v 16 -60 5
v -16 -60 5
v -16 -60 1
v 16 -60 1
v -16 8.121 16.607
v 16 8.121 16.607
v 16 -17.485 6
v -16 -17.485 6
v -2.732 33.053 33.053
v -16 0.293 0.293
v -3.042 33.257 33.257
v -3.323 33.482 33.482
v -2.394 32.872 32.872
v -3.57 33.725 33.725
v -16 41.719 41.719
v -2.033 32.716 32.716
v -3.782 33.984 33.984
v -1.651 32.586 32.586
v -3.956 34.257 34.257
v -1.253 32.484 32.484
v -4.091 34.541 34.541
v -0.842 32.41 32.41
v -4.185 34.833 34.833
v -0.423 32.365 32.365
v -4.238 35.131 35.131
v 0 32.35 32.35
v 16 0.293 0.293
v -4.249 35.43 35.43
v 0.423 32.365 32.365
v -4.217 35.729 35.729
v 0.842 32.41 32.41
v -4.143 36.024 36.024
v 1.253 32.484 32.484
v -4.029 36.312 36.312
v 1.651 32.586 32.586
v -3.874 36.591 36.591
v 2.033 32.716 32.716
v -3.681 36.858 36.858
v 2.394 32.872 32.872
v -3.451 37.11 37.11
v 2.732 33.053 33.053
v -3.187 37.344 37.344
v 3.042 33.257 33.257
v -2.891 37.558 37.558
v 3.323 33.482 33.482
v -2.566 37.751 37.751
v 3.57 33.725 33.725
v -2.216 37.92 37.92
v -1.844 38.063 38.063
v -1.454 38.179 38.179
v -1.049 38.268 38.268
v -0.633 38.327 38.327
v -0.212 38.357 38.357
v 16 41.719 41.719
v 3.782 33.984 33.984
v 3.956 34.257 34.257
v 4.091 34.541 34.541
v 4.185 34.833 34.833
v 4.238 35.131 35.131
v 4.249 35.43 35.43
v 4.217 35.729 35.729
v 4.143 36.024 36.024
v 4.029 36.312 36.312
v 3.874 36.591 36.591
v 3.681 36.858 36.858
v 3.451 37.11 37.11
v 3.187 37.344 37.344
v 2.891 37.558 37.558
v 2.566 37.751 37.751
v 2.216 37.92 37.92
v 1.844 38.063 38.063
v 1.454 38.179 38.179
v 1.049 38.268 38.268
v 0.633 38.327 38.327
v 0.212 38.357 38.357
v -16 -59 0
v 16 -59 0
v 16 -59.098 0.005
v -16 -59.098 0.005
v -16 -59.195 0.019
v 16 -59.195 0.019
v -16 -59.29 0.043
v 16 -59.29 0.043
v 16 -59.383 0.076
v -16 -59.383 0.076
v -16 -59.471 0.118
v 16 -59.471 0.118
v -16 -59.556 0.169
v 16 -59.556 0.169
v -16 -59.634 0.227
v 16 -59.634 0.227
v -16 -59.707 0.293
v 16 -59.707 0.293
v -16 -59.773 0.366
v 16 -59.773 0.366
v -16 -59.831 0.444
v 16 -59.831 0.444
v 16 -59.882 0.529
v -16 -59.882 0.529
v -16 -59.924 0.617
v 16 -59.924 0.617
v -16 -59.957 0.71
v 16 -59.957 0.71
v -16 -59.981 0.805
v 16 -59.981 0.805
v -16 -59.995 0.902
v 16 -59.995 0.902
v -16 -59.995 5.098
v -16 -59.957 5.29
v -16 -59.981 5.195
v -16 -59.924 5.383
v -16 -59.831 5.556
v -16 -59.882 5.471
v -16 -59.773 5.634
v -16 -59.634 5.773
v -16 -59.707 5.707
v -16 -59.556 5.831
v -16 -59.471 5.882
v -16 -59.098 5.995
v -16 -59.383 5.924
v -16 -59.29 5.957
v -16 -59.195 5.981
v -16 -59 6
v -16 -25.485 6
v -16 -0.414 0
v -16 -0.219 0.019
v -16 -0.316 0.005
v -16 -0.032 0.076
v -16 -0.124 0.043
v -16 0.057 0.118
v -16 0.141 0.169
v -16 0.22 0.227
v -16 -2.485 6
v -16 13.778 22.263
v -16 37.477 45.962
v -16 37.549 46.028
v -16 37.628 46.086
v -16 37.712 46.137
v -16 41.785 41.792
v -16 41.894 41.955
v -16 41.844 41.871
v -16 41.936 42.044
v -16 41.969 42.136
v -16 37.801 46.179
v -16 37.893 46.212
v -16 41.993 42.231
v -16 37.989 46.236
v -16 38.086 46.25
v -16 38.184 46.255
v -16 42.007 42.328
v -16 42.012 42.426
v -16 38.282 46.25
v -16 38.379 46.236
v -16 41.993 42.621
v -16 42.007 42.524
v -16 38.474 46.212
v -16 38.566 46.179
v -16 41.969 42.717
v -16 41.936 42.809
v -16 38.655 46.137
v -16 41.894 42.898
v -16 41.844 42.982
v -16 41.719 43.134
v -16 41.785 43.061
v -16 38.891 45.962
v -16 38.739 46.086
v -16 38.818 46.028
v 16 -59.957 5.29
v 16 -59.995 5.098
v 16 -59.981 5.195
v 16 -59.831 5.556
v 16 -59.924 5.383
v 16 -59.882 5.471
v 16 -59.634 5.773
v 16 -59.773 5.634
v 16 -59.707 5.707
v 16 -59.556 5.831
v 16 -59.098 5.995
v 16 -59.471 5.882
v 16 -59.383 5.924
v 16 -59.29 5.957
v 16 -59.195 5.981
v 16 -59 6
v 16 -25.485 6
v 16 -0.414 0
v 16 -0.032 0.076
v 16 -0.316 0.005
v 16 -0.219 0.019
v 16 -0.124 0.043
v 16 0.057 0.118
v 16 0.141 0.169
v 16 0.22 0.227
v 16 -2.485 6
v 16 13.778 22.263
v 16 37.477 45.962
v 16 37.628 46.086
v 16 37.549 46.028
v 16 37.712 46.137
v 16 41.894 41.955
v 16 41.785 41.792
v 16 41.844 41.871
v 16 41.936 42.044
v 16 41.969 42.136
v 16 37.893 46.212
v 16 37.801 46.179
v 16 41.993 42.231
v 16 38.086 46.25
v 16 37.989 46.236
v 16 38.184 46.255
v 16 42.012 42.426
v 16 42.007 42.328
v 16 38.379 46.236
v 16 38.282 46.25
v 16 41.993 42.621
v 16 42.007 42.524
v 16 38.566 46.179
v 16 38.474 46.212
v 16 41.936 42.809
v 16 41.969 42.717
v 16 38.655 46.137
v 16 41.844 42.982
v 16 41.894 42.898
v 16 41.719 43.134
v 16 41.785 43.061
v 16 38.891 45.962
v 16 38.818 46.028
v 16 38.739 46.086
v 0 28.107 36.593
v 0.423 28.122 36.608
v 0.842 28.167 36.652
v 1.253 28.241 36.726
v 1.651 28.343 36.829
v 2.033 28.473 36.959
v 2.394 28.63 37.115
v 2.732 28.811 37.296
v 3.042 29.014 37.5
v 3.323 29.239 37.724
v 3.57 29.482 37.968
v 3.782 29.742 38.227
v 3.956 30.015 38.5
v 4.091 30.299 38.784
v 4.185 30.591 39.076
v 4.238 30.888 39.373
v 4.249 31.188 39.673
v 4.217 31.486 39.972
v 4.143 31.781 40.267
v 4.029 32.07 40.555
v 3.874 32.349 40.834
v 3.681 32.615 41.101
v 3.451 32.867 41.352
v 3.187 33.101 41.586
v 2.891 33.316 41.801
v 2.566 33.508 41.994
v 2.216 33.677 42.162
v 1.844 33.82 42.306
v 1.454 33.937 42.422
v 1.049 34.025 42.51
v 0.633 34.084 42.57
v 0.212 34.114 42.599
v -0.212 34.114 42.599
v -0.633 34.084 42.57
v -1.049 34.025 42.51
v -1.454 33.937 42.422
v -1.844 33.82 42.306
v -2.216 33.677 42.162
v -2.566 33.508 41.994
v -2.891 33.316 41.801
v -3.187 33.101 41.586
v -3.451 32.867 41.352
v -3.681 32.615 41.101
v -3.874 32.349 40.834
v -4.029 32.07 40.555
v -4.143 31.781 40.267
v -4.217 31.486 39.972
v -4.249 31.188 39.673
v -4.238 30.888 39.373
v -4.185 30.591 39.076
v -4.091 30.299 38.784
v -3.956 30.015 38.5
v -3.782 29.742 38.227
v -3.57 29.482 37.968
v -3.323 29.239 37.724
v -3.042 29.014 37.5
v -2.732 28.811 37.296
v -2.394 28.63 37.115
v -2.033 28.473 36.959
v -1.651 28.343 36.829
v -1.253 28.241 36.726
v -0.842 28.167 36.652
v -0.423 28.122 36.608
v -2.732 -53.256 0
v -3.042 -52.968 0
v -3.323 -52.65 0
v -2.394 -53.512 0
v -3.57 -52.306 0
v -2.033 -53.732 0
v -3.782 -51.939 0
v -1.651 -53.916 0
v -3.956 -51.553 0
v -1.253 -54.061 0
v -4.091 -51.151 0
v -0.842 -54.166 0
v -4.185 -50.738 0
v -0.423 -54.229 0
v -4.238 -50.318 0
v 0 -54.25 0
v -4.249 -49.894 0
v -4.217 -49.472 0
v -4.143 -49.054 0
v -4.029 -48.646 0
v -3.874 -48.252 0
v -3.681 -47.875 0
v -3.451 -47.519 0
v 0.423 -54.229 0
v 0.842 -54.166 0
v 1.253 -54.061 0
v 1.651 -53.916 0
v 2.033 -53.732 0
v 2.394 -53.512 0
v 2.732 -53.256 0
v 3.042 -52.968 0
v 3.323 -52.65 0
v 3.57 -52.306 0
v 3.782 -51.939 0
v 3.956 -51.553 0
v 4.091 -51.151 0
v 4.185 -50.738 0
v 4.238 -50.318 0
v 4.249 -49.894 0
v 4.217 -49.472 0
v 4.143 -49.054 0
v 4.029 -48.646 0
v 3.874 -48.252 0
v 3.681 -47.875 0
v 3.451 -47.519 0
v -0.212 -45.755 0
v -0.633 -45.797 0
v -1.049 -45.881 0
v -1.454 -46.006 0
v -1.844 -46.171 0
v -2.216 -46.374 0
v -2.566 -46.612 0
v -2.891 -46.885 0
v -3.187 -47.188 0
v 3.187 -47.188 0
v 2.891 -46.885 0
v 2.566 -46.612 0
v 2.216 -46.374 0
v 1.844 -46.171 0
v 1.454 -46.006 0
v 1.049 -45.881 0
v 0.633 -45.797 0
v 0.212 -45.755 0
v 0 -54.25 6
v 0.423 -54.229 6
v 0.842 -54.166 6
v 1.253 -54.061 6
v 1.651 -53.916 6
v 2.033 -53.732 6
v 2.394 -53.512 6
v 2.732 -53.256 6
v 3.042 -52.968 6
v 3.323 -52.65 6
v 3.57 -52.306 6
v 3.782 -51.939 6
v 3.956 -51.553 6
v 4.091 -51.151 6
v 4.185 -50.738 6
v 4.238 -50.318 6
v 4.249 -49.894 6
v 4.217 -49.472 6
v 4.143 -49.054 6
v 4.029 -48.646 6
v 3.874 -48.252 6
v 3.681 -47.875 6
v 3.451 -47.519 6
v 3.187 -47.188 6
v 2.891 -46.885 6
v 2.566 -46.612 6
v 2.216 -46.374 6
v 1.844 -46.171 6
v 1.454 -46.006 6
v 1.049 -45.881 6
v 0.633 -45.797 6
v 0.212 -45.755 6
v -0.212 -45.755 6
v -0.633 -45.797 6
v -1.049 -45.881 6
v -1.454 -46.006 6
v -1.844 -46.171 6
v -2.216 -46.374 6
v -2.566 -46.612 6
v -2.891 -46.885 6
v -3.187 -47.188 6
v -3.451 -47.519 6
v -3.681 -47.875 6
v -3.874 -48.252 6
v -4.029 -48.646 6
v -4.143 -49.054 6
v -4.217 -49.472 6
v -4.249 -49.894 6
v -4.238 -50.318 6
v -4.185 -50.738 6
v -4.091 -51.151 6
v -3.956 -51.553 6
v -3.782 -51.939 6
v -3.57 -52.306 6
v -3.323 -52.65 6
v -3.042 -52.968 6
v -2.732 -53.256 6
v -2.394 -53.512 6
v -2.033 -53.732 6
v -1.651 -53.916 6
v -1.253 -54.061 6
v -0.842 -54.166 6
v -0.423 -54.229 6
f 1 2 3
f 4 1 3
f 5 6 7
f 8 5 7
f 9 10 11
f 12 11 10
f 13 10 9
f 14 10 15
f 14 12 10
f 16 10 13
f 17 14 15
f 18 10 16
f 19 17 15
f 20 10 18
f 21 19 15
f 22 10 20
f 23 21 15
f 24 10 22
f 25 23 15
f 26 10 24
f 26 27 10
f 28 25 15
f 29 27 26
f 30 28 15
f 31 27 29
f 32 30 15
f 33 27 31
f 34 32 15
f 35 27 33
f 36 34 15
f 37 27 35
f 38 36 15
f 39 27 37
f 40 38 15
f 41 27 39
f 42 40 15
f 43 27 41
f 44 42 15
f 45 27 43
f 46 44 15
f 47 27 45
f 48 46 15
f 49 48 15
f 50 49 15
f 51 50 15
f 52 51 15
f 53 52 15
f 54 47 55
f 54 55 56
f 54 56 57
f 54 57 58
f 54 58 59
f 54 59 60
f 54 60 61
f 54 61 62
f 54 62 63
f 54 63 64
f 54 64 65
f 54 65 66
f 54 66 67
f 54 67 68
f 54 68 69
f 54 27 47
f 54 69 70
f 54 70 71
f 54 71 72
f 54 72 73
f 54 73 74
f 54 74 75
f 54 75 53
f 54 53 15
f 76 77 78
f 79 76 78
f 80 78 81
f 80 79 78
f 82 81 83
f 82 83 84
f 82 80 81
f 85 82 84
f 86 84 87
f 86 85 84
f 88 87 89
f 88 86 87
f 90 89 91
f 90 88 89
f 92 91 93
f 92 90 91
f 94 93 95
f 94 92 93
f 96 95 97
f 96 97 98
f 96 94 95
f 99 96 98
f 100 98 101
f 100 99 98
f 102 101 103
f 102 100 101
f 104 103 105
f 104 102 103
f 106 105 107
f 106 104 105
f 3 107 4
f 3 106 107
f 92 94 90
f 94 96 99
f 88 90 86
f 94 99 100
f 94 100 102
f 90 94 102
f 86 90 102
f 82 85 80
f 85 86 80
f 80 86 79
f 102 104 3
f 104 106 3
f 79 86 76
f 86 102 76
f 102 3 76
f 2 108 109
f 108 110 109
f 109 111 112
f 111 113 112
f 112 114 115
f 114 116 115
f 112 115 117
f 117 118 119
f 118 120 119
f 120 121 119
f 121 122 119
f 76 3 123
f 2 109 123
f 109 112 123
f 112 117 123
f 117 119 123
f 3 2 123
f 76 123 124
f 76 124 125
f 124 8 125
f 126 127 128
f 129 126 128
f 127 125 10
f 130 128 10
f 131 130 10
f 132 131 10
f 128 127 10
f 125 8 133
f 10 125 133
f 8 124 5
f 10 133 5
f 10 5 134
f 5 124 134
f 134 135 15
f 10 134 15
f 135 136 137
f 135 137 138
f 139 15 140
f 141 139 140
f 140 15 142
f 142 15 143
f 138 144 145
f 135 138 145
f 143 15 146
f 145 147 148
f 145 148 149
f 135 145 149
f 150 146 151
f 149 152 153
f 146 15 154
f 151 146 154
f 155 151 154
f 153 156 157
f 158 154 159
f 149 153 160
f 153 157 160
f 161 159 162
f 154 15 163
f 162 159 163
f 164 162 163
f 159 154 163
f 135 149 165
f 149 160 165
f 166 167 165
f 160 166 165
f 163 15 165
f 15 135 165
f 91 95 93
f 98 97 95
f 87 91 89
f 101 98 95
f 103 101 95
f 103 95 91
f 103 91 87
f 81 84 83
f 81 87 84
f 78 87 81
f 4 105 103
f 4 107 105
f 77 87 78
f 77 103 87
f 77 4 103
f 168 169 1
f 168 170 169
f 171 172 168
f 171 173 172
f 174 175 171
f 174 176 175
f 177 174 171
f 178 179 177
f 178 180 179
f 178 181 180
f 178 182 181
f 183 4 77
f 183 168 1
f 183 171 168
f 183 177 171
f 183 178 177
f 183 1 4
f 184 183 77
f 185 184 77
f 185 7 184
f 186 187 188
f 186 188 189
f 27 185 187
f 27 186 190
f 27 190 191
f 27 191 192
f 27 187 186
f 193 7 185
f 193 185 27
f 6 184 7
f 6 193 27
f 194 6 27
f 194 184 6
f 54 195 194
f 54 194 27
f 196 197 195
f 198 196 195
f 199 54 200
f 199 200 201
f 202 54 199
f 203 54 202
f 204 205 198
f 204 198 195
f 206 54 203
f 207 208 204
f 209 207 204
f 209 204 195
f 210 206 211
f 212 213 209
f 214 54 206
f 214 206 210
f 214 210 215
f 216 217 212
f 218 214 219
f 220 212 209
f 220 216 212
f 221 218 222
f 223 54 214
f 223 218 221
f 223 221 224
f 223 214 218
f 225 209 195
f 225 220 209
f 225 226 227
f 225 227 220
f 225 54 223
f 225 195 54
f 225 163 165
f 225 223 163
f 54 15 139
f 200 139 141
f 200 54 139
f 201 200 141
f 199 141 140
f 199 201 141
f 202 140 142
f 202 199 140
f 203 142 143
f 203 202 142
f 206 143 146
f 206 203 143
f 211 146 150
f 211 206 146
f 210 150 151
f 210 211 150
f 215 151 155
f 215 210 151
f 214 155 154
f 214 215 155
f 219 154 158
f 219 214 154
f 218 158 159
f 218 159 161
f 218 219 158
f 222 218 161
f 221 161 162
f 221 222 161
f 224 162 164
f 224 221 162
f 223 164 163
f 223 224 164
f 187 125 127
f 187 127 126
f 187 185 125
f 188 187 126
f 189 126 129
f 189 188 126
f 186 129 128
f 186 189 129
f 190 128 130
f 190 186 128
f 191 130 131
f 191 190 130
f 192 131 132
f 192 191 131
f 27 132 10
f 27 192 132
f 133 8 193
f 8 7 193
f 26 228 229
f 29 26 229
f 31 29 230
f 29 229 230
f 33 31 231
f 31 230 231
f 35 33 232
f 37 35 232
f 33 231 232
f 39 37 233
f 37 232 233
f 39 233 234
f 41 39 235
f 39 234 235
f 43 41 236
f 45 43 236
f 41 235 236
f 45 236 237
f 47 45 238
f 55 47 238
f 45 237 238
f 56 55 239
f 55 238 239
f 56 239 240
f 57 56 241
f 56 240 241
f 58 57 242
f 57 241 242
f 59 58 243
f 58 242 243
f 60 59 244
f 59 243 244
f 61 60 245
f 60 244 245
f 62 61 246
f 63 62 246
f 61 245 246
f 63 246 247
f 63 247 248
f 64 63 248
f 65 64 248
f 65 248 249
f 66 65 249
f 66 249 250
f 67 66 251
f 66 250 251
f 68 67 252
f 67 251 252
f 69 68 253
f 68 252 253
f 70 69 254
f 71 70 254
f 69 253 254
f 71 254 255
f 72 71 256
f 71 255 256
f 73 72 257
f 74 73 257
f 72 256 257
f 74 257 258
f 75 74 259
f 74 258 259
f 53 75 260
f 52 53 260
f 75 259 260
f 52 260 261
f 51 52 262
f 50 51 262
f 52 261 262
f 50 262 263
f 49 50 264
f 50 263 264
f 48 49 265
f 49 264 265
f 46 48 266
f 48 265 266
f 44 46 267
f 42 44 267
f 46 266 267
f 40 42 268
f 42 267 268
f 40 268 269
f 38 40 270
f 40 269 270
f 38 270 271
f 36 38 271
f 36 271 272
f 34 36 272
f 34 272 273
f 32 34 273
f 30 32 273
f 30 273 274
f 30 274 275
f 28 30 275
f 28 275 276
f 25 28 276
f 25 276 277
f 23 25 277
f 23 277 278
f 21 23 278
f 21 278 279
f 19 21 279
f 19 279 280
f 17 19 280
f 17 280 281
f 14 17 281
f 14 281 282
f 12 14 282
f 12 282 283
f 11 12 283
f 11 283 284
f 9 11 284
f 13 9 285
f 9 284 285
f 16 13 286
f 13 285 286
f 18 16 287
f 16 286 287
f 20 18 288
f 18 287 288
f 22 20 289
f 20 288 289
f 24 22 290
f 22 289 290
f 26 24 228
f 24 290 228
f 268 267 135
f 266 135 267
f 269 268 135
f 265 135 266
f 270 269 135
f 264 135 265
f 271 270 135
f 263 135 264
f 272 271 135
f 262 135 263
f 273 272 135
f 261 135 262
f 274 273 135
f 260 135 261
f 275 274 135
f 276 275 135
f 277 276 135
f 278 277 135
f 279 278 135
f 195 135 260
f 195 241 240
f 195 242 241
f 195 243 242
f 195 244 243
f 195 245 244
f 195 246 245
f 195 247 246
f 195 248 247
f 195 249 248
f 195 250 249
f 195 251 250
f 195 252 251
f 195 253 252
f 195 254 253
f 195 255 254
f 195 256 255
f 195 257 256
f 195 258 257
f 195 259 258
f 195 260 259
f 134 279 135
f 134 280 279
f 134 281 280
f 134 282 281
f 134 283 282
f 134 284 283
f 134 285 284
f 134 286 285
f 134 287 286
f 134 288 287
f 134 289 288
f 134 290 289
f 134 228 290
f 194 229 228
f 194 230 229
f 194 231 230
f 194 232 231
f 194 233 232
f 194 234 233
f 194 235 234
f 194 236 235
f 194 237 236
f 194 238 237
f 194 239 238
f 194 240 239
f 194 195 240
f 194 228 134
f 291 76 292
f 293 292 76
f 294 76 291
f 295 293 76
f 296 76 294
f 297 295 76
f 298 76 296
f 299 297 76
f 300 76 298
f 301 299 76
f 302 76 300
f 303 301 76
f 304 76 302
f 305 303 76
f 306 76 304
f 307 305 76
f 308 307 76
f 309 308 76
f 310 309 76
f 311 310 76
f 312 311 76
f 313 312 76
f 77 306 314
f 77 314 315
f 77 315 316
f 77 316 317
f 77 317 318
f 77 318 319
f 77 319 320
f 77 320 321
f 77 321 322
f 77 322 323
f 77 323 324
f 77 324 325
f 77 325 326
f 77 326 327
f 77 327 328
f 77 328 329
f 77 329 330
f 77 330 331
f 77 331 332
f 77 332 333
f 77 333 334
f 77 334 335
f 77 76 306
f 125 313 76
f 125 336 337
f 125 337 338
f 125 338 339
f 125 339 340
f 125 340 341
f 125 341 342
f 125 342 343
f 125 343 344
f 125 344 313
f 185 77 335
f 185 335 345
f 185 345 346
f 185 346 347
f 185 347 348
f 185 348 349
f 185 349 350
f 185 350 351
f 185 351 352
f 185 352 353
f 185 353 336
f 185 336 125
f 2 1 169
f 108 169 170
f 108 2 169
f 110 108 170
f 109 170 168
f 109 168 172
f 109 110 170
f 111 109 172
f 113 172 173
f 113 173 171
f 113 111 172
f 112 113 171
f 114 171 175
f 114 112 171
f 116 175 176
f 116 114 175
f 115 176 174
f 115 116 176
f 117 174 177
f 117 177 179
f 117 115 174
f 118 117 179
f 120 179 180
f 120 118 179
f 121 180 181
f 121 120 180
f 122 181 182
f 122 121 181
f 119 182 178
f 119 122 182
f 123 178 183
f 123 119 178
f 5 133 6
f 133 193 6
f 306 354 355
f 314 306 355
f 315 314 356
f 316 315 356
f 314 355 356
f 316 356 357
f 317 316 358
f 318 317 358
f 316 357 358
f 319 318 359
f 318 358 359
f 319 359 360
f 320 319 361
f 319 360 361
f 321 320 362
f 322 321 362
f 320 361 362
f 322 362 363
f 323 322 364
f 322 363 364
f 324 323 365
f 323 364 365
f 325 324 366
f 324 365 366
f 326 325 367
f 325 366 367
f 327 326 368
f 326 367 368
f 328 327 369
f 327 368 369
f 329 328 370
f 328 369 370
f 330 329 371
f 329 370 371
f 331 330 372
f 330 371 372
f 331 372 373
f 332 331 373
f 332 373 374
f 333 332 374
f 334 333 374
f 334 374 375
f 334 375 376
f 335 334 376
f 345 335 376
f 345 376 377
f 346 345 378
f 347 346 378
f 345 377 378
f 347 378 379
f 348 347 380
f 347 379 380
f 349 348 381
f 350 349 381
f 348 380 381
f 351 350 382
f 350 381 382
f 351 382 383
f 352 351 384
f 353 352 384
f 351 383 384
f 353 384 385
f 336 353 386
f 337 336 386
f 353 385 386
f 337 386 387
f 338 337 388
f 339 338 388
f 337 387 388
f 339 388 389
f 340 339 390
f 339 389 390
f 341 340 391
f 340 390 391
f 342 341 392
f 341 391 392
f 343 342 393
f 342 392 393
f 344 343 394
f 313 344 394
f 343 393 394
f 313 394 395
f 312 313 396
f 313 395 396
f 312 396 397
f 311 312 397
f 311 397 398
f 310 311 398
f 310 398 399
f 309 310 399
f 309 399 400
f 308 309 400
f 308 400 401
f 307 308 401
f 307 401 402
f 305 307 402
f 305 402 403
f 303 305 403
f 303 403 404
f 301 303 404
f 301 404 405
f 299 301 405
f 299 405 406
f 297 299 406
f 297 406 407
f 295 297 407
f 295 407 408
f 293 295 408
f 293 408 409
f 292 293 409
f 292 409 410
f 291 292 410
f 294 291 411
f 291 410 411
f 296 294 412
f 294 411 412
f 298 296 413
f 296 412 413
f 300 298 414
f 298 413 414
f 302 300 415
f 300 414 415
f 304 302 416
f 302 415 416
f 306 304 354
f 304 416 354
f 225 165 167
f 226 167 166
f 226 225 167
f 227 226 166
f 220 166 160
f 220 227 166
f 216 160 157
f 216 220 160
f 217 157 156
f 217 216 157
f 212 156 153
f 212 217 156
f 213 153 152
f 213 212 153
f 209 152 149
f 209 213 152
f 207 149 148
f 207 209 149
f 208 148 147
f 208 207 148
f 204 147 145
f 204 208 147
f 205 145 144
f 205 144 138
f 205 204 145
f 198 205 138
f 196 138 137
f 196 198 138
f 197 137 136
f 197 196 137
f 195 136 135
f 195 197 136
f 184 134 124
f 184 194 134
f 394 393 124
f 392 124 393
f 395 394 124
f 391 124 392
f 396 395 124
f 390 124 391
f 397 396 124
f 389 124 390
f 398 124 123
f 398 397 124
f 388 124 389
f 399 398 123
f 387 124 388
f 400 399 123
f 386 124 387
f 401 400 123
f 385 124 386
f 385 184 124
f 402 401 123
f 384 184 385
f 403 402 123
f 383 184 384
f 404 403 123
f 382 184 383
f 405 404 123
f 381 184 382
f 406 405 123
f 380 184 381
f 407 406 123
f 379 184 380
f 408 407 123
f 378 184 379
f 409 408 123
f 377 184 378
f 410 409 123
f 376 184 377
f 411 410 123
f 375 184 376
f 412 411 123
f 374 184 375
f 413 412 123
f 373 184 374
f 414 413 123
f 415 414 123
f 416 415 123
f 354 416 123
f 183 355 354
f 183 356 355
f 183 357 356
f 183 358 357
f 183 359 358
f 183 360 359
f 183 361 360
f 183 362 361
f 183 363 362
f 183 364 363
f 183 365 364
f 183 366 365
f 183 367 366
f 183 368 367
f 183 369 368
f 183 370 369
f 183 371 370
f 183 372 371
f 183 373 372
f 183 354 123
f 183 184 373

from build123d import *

# Parameters (mm, degrees)
PAD_DEPTH       = 16
SKETCH001_R     = 4.25
POCKET_DEPTH    = 6
SKETCH002_R     = 4.25
POCKET001_DEPTH = 6
FILLET_R        = 1


with BuildPart() as part:
    # Sketch → Pad (new body, symmetric)
    with BuildSketch(Plane.YZ):
        Polygon((-60, 0), (0, 0), (42.4264068712, 42.4264068712), (38.1837661841, 46.6690475583), (13.7781745931, 22.2634559673), (-25.4852813742, 6), (-60, 6), align=None)
        Polygon((8.1213203436, 16.6066017178), (-17.4852813742, 6), (-2.4852813742, 6), align=None, mode=Mode.SUBTRACT)
    extrude(amount=PAD_DEPTH, both=True)

    # Sketch001 (on Face6 of Pad) → Pocket (cut)
    with BuildSketch(Plane(origin=(0, 0, 6), x_dir=(0, -1, 0), z_dir=(0, 0, 1))):
        with Locations((50, 0)):
            Circle(SKETCH001_R)
    extrude(amount=-POCKET_DEPTH, mode=Mode.SUBTRACT)

    # Sketch002 (on Face9 of Pocket) → Pocket001 (cut)
    with BuildSketch(Plane(origin=(0, -4.2426406871, 4.2426406871), x_dir=(0, -0.7071067812, -0.7071067812), z_dir=(0, -0.7071067812, 0.7071067812))):
        with Locations((-50, 0)):
            Circle(SKETCH002_R)
    extrude(amount=-POCKET001_DEPTH, mode=Mode.SUBTRACT)

    # Fillet
    fillet_edges = [part.edges().sort_by_distance(p)[0] for p in [
        (0, 0, 0),
        (0, -60, 0),
        (0, -60, 6),
        (0, 38.183766, 46.669048),
        (0, 42.426407, 42.426407),
    ]]
    fillet(fillet_edges, radius=FILLET_R)


solid = part.part
